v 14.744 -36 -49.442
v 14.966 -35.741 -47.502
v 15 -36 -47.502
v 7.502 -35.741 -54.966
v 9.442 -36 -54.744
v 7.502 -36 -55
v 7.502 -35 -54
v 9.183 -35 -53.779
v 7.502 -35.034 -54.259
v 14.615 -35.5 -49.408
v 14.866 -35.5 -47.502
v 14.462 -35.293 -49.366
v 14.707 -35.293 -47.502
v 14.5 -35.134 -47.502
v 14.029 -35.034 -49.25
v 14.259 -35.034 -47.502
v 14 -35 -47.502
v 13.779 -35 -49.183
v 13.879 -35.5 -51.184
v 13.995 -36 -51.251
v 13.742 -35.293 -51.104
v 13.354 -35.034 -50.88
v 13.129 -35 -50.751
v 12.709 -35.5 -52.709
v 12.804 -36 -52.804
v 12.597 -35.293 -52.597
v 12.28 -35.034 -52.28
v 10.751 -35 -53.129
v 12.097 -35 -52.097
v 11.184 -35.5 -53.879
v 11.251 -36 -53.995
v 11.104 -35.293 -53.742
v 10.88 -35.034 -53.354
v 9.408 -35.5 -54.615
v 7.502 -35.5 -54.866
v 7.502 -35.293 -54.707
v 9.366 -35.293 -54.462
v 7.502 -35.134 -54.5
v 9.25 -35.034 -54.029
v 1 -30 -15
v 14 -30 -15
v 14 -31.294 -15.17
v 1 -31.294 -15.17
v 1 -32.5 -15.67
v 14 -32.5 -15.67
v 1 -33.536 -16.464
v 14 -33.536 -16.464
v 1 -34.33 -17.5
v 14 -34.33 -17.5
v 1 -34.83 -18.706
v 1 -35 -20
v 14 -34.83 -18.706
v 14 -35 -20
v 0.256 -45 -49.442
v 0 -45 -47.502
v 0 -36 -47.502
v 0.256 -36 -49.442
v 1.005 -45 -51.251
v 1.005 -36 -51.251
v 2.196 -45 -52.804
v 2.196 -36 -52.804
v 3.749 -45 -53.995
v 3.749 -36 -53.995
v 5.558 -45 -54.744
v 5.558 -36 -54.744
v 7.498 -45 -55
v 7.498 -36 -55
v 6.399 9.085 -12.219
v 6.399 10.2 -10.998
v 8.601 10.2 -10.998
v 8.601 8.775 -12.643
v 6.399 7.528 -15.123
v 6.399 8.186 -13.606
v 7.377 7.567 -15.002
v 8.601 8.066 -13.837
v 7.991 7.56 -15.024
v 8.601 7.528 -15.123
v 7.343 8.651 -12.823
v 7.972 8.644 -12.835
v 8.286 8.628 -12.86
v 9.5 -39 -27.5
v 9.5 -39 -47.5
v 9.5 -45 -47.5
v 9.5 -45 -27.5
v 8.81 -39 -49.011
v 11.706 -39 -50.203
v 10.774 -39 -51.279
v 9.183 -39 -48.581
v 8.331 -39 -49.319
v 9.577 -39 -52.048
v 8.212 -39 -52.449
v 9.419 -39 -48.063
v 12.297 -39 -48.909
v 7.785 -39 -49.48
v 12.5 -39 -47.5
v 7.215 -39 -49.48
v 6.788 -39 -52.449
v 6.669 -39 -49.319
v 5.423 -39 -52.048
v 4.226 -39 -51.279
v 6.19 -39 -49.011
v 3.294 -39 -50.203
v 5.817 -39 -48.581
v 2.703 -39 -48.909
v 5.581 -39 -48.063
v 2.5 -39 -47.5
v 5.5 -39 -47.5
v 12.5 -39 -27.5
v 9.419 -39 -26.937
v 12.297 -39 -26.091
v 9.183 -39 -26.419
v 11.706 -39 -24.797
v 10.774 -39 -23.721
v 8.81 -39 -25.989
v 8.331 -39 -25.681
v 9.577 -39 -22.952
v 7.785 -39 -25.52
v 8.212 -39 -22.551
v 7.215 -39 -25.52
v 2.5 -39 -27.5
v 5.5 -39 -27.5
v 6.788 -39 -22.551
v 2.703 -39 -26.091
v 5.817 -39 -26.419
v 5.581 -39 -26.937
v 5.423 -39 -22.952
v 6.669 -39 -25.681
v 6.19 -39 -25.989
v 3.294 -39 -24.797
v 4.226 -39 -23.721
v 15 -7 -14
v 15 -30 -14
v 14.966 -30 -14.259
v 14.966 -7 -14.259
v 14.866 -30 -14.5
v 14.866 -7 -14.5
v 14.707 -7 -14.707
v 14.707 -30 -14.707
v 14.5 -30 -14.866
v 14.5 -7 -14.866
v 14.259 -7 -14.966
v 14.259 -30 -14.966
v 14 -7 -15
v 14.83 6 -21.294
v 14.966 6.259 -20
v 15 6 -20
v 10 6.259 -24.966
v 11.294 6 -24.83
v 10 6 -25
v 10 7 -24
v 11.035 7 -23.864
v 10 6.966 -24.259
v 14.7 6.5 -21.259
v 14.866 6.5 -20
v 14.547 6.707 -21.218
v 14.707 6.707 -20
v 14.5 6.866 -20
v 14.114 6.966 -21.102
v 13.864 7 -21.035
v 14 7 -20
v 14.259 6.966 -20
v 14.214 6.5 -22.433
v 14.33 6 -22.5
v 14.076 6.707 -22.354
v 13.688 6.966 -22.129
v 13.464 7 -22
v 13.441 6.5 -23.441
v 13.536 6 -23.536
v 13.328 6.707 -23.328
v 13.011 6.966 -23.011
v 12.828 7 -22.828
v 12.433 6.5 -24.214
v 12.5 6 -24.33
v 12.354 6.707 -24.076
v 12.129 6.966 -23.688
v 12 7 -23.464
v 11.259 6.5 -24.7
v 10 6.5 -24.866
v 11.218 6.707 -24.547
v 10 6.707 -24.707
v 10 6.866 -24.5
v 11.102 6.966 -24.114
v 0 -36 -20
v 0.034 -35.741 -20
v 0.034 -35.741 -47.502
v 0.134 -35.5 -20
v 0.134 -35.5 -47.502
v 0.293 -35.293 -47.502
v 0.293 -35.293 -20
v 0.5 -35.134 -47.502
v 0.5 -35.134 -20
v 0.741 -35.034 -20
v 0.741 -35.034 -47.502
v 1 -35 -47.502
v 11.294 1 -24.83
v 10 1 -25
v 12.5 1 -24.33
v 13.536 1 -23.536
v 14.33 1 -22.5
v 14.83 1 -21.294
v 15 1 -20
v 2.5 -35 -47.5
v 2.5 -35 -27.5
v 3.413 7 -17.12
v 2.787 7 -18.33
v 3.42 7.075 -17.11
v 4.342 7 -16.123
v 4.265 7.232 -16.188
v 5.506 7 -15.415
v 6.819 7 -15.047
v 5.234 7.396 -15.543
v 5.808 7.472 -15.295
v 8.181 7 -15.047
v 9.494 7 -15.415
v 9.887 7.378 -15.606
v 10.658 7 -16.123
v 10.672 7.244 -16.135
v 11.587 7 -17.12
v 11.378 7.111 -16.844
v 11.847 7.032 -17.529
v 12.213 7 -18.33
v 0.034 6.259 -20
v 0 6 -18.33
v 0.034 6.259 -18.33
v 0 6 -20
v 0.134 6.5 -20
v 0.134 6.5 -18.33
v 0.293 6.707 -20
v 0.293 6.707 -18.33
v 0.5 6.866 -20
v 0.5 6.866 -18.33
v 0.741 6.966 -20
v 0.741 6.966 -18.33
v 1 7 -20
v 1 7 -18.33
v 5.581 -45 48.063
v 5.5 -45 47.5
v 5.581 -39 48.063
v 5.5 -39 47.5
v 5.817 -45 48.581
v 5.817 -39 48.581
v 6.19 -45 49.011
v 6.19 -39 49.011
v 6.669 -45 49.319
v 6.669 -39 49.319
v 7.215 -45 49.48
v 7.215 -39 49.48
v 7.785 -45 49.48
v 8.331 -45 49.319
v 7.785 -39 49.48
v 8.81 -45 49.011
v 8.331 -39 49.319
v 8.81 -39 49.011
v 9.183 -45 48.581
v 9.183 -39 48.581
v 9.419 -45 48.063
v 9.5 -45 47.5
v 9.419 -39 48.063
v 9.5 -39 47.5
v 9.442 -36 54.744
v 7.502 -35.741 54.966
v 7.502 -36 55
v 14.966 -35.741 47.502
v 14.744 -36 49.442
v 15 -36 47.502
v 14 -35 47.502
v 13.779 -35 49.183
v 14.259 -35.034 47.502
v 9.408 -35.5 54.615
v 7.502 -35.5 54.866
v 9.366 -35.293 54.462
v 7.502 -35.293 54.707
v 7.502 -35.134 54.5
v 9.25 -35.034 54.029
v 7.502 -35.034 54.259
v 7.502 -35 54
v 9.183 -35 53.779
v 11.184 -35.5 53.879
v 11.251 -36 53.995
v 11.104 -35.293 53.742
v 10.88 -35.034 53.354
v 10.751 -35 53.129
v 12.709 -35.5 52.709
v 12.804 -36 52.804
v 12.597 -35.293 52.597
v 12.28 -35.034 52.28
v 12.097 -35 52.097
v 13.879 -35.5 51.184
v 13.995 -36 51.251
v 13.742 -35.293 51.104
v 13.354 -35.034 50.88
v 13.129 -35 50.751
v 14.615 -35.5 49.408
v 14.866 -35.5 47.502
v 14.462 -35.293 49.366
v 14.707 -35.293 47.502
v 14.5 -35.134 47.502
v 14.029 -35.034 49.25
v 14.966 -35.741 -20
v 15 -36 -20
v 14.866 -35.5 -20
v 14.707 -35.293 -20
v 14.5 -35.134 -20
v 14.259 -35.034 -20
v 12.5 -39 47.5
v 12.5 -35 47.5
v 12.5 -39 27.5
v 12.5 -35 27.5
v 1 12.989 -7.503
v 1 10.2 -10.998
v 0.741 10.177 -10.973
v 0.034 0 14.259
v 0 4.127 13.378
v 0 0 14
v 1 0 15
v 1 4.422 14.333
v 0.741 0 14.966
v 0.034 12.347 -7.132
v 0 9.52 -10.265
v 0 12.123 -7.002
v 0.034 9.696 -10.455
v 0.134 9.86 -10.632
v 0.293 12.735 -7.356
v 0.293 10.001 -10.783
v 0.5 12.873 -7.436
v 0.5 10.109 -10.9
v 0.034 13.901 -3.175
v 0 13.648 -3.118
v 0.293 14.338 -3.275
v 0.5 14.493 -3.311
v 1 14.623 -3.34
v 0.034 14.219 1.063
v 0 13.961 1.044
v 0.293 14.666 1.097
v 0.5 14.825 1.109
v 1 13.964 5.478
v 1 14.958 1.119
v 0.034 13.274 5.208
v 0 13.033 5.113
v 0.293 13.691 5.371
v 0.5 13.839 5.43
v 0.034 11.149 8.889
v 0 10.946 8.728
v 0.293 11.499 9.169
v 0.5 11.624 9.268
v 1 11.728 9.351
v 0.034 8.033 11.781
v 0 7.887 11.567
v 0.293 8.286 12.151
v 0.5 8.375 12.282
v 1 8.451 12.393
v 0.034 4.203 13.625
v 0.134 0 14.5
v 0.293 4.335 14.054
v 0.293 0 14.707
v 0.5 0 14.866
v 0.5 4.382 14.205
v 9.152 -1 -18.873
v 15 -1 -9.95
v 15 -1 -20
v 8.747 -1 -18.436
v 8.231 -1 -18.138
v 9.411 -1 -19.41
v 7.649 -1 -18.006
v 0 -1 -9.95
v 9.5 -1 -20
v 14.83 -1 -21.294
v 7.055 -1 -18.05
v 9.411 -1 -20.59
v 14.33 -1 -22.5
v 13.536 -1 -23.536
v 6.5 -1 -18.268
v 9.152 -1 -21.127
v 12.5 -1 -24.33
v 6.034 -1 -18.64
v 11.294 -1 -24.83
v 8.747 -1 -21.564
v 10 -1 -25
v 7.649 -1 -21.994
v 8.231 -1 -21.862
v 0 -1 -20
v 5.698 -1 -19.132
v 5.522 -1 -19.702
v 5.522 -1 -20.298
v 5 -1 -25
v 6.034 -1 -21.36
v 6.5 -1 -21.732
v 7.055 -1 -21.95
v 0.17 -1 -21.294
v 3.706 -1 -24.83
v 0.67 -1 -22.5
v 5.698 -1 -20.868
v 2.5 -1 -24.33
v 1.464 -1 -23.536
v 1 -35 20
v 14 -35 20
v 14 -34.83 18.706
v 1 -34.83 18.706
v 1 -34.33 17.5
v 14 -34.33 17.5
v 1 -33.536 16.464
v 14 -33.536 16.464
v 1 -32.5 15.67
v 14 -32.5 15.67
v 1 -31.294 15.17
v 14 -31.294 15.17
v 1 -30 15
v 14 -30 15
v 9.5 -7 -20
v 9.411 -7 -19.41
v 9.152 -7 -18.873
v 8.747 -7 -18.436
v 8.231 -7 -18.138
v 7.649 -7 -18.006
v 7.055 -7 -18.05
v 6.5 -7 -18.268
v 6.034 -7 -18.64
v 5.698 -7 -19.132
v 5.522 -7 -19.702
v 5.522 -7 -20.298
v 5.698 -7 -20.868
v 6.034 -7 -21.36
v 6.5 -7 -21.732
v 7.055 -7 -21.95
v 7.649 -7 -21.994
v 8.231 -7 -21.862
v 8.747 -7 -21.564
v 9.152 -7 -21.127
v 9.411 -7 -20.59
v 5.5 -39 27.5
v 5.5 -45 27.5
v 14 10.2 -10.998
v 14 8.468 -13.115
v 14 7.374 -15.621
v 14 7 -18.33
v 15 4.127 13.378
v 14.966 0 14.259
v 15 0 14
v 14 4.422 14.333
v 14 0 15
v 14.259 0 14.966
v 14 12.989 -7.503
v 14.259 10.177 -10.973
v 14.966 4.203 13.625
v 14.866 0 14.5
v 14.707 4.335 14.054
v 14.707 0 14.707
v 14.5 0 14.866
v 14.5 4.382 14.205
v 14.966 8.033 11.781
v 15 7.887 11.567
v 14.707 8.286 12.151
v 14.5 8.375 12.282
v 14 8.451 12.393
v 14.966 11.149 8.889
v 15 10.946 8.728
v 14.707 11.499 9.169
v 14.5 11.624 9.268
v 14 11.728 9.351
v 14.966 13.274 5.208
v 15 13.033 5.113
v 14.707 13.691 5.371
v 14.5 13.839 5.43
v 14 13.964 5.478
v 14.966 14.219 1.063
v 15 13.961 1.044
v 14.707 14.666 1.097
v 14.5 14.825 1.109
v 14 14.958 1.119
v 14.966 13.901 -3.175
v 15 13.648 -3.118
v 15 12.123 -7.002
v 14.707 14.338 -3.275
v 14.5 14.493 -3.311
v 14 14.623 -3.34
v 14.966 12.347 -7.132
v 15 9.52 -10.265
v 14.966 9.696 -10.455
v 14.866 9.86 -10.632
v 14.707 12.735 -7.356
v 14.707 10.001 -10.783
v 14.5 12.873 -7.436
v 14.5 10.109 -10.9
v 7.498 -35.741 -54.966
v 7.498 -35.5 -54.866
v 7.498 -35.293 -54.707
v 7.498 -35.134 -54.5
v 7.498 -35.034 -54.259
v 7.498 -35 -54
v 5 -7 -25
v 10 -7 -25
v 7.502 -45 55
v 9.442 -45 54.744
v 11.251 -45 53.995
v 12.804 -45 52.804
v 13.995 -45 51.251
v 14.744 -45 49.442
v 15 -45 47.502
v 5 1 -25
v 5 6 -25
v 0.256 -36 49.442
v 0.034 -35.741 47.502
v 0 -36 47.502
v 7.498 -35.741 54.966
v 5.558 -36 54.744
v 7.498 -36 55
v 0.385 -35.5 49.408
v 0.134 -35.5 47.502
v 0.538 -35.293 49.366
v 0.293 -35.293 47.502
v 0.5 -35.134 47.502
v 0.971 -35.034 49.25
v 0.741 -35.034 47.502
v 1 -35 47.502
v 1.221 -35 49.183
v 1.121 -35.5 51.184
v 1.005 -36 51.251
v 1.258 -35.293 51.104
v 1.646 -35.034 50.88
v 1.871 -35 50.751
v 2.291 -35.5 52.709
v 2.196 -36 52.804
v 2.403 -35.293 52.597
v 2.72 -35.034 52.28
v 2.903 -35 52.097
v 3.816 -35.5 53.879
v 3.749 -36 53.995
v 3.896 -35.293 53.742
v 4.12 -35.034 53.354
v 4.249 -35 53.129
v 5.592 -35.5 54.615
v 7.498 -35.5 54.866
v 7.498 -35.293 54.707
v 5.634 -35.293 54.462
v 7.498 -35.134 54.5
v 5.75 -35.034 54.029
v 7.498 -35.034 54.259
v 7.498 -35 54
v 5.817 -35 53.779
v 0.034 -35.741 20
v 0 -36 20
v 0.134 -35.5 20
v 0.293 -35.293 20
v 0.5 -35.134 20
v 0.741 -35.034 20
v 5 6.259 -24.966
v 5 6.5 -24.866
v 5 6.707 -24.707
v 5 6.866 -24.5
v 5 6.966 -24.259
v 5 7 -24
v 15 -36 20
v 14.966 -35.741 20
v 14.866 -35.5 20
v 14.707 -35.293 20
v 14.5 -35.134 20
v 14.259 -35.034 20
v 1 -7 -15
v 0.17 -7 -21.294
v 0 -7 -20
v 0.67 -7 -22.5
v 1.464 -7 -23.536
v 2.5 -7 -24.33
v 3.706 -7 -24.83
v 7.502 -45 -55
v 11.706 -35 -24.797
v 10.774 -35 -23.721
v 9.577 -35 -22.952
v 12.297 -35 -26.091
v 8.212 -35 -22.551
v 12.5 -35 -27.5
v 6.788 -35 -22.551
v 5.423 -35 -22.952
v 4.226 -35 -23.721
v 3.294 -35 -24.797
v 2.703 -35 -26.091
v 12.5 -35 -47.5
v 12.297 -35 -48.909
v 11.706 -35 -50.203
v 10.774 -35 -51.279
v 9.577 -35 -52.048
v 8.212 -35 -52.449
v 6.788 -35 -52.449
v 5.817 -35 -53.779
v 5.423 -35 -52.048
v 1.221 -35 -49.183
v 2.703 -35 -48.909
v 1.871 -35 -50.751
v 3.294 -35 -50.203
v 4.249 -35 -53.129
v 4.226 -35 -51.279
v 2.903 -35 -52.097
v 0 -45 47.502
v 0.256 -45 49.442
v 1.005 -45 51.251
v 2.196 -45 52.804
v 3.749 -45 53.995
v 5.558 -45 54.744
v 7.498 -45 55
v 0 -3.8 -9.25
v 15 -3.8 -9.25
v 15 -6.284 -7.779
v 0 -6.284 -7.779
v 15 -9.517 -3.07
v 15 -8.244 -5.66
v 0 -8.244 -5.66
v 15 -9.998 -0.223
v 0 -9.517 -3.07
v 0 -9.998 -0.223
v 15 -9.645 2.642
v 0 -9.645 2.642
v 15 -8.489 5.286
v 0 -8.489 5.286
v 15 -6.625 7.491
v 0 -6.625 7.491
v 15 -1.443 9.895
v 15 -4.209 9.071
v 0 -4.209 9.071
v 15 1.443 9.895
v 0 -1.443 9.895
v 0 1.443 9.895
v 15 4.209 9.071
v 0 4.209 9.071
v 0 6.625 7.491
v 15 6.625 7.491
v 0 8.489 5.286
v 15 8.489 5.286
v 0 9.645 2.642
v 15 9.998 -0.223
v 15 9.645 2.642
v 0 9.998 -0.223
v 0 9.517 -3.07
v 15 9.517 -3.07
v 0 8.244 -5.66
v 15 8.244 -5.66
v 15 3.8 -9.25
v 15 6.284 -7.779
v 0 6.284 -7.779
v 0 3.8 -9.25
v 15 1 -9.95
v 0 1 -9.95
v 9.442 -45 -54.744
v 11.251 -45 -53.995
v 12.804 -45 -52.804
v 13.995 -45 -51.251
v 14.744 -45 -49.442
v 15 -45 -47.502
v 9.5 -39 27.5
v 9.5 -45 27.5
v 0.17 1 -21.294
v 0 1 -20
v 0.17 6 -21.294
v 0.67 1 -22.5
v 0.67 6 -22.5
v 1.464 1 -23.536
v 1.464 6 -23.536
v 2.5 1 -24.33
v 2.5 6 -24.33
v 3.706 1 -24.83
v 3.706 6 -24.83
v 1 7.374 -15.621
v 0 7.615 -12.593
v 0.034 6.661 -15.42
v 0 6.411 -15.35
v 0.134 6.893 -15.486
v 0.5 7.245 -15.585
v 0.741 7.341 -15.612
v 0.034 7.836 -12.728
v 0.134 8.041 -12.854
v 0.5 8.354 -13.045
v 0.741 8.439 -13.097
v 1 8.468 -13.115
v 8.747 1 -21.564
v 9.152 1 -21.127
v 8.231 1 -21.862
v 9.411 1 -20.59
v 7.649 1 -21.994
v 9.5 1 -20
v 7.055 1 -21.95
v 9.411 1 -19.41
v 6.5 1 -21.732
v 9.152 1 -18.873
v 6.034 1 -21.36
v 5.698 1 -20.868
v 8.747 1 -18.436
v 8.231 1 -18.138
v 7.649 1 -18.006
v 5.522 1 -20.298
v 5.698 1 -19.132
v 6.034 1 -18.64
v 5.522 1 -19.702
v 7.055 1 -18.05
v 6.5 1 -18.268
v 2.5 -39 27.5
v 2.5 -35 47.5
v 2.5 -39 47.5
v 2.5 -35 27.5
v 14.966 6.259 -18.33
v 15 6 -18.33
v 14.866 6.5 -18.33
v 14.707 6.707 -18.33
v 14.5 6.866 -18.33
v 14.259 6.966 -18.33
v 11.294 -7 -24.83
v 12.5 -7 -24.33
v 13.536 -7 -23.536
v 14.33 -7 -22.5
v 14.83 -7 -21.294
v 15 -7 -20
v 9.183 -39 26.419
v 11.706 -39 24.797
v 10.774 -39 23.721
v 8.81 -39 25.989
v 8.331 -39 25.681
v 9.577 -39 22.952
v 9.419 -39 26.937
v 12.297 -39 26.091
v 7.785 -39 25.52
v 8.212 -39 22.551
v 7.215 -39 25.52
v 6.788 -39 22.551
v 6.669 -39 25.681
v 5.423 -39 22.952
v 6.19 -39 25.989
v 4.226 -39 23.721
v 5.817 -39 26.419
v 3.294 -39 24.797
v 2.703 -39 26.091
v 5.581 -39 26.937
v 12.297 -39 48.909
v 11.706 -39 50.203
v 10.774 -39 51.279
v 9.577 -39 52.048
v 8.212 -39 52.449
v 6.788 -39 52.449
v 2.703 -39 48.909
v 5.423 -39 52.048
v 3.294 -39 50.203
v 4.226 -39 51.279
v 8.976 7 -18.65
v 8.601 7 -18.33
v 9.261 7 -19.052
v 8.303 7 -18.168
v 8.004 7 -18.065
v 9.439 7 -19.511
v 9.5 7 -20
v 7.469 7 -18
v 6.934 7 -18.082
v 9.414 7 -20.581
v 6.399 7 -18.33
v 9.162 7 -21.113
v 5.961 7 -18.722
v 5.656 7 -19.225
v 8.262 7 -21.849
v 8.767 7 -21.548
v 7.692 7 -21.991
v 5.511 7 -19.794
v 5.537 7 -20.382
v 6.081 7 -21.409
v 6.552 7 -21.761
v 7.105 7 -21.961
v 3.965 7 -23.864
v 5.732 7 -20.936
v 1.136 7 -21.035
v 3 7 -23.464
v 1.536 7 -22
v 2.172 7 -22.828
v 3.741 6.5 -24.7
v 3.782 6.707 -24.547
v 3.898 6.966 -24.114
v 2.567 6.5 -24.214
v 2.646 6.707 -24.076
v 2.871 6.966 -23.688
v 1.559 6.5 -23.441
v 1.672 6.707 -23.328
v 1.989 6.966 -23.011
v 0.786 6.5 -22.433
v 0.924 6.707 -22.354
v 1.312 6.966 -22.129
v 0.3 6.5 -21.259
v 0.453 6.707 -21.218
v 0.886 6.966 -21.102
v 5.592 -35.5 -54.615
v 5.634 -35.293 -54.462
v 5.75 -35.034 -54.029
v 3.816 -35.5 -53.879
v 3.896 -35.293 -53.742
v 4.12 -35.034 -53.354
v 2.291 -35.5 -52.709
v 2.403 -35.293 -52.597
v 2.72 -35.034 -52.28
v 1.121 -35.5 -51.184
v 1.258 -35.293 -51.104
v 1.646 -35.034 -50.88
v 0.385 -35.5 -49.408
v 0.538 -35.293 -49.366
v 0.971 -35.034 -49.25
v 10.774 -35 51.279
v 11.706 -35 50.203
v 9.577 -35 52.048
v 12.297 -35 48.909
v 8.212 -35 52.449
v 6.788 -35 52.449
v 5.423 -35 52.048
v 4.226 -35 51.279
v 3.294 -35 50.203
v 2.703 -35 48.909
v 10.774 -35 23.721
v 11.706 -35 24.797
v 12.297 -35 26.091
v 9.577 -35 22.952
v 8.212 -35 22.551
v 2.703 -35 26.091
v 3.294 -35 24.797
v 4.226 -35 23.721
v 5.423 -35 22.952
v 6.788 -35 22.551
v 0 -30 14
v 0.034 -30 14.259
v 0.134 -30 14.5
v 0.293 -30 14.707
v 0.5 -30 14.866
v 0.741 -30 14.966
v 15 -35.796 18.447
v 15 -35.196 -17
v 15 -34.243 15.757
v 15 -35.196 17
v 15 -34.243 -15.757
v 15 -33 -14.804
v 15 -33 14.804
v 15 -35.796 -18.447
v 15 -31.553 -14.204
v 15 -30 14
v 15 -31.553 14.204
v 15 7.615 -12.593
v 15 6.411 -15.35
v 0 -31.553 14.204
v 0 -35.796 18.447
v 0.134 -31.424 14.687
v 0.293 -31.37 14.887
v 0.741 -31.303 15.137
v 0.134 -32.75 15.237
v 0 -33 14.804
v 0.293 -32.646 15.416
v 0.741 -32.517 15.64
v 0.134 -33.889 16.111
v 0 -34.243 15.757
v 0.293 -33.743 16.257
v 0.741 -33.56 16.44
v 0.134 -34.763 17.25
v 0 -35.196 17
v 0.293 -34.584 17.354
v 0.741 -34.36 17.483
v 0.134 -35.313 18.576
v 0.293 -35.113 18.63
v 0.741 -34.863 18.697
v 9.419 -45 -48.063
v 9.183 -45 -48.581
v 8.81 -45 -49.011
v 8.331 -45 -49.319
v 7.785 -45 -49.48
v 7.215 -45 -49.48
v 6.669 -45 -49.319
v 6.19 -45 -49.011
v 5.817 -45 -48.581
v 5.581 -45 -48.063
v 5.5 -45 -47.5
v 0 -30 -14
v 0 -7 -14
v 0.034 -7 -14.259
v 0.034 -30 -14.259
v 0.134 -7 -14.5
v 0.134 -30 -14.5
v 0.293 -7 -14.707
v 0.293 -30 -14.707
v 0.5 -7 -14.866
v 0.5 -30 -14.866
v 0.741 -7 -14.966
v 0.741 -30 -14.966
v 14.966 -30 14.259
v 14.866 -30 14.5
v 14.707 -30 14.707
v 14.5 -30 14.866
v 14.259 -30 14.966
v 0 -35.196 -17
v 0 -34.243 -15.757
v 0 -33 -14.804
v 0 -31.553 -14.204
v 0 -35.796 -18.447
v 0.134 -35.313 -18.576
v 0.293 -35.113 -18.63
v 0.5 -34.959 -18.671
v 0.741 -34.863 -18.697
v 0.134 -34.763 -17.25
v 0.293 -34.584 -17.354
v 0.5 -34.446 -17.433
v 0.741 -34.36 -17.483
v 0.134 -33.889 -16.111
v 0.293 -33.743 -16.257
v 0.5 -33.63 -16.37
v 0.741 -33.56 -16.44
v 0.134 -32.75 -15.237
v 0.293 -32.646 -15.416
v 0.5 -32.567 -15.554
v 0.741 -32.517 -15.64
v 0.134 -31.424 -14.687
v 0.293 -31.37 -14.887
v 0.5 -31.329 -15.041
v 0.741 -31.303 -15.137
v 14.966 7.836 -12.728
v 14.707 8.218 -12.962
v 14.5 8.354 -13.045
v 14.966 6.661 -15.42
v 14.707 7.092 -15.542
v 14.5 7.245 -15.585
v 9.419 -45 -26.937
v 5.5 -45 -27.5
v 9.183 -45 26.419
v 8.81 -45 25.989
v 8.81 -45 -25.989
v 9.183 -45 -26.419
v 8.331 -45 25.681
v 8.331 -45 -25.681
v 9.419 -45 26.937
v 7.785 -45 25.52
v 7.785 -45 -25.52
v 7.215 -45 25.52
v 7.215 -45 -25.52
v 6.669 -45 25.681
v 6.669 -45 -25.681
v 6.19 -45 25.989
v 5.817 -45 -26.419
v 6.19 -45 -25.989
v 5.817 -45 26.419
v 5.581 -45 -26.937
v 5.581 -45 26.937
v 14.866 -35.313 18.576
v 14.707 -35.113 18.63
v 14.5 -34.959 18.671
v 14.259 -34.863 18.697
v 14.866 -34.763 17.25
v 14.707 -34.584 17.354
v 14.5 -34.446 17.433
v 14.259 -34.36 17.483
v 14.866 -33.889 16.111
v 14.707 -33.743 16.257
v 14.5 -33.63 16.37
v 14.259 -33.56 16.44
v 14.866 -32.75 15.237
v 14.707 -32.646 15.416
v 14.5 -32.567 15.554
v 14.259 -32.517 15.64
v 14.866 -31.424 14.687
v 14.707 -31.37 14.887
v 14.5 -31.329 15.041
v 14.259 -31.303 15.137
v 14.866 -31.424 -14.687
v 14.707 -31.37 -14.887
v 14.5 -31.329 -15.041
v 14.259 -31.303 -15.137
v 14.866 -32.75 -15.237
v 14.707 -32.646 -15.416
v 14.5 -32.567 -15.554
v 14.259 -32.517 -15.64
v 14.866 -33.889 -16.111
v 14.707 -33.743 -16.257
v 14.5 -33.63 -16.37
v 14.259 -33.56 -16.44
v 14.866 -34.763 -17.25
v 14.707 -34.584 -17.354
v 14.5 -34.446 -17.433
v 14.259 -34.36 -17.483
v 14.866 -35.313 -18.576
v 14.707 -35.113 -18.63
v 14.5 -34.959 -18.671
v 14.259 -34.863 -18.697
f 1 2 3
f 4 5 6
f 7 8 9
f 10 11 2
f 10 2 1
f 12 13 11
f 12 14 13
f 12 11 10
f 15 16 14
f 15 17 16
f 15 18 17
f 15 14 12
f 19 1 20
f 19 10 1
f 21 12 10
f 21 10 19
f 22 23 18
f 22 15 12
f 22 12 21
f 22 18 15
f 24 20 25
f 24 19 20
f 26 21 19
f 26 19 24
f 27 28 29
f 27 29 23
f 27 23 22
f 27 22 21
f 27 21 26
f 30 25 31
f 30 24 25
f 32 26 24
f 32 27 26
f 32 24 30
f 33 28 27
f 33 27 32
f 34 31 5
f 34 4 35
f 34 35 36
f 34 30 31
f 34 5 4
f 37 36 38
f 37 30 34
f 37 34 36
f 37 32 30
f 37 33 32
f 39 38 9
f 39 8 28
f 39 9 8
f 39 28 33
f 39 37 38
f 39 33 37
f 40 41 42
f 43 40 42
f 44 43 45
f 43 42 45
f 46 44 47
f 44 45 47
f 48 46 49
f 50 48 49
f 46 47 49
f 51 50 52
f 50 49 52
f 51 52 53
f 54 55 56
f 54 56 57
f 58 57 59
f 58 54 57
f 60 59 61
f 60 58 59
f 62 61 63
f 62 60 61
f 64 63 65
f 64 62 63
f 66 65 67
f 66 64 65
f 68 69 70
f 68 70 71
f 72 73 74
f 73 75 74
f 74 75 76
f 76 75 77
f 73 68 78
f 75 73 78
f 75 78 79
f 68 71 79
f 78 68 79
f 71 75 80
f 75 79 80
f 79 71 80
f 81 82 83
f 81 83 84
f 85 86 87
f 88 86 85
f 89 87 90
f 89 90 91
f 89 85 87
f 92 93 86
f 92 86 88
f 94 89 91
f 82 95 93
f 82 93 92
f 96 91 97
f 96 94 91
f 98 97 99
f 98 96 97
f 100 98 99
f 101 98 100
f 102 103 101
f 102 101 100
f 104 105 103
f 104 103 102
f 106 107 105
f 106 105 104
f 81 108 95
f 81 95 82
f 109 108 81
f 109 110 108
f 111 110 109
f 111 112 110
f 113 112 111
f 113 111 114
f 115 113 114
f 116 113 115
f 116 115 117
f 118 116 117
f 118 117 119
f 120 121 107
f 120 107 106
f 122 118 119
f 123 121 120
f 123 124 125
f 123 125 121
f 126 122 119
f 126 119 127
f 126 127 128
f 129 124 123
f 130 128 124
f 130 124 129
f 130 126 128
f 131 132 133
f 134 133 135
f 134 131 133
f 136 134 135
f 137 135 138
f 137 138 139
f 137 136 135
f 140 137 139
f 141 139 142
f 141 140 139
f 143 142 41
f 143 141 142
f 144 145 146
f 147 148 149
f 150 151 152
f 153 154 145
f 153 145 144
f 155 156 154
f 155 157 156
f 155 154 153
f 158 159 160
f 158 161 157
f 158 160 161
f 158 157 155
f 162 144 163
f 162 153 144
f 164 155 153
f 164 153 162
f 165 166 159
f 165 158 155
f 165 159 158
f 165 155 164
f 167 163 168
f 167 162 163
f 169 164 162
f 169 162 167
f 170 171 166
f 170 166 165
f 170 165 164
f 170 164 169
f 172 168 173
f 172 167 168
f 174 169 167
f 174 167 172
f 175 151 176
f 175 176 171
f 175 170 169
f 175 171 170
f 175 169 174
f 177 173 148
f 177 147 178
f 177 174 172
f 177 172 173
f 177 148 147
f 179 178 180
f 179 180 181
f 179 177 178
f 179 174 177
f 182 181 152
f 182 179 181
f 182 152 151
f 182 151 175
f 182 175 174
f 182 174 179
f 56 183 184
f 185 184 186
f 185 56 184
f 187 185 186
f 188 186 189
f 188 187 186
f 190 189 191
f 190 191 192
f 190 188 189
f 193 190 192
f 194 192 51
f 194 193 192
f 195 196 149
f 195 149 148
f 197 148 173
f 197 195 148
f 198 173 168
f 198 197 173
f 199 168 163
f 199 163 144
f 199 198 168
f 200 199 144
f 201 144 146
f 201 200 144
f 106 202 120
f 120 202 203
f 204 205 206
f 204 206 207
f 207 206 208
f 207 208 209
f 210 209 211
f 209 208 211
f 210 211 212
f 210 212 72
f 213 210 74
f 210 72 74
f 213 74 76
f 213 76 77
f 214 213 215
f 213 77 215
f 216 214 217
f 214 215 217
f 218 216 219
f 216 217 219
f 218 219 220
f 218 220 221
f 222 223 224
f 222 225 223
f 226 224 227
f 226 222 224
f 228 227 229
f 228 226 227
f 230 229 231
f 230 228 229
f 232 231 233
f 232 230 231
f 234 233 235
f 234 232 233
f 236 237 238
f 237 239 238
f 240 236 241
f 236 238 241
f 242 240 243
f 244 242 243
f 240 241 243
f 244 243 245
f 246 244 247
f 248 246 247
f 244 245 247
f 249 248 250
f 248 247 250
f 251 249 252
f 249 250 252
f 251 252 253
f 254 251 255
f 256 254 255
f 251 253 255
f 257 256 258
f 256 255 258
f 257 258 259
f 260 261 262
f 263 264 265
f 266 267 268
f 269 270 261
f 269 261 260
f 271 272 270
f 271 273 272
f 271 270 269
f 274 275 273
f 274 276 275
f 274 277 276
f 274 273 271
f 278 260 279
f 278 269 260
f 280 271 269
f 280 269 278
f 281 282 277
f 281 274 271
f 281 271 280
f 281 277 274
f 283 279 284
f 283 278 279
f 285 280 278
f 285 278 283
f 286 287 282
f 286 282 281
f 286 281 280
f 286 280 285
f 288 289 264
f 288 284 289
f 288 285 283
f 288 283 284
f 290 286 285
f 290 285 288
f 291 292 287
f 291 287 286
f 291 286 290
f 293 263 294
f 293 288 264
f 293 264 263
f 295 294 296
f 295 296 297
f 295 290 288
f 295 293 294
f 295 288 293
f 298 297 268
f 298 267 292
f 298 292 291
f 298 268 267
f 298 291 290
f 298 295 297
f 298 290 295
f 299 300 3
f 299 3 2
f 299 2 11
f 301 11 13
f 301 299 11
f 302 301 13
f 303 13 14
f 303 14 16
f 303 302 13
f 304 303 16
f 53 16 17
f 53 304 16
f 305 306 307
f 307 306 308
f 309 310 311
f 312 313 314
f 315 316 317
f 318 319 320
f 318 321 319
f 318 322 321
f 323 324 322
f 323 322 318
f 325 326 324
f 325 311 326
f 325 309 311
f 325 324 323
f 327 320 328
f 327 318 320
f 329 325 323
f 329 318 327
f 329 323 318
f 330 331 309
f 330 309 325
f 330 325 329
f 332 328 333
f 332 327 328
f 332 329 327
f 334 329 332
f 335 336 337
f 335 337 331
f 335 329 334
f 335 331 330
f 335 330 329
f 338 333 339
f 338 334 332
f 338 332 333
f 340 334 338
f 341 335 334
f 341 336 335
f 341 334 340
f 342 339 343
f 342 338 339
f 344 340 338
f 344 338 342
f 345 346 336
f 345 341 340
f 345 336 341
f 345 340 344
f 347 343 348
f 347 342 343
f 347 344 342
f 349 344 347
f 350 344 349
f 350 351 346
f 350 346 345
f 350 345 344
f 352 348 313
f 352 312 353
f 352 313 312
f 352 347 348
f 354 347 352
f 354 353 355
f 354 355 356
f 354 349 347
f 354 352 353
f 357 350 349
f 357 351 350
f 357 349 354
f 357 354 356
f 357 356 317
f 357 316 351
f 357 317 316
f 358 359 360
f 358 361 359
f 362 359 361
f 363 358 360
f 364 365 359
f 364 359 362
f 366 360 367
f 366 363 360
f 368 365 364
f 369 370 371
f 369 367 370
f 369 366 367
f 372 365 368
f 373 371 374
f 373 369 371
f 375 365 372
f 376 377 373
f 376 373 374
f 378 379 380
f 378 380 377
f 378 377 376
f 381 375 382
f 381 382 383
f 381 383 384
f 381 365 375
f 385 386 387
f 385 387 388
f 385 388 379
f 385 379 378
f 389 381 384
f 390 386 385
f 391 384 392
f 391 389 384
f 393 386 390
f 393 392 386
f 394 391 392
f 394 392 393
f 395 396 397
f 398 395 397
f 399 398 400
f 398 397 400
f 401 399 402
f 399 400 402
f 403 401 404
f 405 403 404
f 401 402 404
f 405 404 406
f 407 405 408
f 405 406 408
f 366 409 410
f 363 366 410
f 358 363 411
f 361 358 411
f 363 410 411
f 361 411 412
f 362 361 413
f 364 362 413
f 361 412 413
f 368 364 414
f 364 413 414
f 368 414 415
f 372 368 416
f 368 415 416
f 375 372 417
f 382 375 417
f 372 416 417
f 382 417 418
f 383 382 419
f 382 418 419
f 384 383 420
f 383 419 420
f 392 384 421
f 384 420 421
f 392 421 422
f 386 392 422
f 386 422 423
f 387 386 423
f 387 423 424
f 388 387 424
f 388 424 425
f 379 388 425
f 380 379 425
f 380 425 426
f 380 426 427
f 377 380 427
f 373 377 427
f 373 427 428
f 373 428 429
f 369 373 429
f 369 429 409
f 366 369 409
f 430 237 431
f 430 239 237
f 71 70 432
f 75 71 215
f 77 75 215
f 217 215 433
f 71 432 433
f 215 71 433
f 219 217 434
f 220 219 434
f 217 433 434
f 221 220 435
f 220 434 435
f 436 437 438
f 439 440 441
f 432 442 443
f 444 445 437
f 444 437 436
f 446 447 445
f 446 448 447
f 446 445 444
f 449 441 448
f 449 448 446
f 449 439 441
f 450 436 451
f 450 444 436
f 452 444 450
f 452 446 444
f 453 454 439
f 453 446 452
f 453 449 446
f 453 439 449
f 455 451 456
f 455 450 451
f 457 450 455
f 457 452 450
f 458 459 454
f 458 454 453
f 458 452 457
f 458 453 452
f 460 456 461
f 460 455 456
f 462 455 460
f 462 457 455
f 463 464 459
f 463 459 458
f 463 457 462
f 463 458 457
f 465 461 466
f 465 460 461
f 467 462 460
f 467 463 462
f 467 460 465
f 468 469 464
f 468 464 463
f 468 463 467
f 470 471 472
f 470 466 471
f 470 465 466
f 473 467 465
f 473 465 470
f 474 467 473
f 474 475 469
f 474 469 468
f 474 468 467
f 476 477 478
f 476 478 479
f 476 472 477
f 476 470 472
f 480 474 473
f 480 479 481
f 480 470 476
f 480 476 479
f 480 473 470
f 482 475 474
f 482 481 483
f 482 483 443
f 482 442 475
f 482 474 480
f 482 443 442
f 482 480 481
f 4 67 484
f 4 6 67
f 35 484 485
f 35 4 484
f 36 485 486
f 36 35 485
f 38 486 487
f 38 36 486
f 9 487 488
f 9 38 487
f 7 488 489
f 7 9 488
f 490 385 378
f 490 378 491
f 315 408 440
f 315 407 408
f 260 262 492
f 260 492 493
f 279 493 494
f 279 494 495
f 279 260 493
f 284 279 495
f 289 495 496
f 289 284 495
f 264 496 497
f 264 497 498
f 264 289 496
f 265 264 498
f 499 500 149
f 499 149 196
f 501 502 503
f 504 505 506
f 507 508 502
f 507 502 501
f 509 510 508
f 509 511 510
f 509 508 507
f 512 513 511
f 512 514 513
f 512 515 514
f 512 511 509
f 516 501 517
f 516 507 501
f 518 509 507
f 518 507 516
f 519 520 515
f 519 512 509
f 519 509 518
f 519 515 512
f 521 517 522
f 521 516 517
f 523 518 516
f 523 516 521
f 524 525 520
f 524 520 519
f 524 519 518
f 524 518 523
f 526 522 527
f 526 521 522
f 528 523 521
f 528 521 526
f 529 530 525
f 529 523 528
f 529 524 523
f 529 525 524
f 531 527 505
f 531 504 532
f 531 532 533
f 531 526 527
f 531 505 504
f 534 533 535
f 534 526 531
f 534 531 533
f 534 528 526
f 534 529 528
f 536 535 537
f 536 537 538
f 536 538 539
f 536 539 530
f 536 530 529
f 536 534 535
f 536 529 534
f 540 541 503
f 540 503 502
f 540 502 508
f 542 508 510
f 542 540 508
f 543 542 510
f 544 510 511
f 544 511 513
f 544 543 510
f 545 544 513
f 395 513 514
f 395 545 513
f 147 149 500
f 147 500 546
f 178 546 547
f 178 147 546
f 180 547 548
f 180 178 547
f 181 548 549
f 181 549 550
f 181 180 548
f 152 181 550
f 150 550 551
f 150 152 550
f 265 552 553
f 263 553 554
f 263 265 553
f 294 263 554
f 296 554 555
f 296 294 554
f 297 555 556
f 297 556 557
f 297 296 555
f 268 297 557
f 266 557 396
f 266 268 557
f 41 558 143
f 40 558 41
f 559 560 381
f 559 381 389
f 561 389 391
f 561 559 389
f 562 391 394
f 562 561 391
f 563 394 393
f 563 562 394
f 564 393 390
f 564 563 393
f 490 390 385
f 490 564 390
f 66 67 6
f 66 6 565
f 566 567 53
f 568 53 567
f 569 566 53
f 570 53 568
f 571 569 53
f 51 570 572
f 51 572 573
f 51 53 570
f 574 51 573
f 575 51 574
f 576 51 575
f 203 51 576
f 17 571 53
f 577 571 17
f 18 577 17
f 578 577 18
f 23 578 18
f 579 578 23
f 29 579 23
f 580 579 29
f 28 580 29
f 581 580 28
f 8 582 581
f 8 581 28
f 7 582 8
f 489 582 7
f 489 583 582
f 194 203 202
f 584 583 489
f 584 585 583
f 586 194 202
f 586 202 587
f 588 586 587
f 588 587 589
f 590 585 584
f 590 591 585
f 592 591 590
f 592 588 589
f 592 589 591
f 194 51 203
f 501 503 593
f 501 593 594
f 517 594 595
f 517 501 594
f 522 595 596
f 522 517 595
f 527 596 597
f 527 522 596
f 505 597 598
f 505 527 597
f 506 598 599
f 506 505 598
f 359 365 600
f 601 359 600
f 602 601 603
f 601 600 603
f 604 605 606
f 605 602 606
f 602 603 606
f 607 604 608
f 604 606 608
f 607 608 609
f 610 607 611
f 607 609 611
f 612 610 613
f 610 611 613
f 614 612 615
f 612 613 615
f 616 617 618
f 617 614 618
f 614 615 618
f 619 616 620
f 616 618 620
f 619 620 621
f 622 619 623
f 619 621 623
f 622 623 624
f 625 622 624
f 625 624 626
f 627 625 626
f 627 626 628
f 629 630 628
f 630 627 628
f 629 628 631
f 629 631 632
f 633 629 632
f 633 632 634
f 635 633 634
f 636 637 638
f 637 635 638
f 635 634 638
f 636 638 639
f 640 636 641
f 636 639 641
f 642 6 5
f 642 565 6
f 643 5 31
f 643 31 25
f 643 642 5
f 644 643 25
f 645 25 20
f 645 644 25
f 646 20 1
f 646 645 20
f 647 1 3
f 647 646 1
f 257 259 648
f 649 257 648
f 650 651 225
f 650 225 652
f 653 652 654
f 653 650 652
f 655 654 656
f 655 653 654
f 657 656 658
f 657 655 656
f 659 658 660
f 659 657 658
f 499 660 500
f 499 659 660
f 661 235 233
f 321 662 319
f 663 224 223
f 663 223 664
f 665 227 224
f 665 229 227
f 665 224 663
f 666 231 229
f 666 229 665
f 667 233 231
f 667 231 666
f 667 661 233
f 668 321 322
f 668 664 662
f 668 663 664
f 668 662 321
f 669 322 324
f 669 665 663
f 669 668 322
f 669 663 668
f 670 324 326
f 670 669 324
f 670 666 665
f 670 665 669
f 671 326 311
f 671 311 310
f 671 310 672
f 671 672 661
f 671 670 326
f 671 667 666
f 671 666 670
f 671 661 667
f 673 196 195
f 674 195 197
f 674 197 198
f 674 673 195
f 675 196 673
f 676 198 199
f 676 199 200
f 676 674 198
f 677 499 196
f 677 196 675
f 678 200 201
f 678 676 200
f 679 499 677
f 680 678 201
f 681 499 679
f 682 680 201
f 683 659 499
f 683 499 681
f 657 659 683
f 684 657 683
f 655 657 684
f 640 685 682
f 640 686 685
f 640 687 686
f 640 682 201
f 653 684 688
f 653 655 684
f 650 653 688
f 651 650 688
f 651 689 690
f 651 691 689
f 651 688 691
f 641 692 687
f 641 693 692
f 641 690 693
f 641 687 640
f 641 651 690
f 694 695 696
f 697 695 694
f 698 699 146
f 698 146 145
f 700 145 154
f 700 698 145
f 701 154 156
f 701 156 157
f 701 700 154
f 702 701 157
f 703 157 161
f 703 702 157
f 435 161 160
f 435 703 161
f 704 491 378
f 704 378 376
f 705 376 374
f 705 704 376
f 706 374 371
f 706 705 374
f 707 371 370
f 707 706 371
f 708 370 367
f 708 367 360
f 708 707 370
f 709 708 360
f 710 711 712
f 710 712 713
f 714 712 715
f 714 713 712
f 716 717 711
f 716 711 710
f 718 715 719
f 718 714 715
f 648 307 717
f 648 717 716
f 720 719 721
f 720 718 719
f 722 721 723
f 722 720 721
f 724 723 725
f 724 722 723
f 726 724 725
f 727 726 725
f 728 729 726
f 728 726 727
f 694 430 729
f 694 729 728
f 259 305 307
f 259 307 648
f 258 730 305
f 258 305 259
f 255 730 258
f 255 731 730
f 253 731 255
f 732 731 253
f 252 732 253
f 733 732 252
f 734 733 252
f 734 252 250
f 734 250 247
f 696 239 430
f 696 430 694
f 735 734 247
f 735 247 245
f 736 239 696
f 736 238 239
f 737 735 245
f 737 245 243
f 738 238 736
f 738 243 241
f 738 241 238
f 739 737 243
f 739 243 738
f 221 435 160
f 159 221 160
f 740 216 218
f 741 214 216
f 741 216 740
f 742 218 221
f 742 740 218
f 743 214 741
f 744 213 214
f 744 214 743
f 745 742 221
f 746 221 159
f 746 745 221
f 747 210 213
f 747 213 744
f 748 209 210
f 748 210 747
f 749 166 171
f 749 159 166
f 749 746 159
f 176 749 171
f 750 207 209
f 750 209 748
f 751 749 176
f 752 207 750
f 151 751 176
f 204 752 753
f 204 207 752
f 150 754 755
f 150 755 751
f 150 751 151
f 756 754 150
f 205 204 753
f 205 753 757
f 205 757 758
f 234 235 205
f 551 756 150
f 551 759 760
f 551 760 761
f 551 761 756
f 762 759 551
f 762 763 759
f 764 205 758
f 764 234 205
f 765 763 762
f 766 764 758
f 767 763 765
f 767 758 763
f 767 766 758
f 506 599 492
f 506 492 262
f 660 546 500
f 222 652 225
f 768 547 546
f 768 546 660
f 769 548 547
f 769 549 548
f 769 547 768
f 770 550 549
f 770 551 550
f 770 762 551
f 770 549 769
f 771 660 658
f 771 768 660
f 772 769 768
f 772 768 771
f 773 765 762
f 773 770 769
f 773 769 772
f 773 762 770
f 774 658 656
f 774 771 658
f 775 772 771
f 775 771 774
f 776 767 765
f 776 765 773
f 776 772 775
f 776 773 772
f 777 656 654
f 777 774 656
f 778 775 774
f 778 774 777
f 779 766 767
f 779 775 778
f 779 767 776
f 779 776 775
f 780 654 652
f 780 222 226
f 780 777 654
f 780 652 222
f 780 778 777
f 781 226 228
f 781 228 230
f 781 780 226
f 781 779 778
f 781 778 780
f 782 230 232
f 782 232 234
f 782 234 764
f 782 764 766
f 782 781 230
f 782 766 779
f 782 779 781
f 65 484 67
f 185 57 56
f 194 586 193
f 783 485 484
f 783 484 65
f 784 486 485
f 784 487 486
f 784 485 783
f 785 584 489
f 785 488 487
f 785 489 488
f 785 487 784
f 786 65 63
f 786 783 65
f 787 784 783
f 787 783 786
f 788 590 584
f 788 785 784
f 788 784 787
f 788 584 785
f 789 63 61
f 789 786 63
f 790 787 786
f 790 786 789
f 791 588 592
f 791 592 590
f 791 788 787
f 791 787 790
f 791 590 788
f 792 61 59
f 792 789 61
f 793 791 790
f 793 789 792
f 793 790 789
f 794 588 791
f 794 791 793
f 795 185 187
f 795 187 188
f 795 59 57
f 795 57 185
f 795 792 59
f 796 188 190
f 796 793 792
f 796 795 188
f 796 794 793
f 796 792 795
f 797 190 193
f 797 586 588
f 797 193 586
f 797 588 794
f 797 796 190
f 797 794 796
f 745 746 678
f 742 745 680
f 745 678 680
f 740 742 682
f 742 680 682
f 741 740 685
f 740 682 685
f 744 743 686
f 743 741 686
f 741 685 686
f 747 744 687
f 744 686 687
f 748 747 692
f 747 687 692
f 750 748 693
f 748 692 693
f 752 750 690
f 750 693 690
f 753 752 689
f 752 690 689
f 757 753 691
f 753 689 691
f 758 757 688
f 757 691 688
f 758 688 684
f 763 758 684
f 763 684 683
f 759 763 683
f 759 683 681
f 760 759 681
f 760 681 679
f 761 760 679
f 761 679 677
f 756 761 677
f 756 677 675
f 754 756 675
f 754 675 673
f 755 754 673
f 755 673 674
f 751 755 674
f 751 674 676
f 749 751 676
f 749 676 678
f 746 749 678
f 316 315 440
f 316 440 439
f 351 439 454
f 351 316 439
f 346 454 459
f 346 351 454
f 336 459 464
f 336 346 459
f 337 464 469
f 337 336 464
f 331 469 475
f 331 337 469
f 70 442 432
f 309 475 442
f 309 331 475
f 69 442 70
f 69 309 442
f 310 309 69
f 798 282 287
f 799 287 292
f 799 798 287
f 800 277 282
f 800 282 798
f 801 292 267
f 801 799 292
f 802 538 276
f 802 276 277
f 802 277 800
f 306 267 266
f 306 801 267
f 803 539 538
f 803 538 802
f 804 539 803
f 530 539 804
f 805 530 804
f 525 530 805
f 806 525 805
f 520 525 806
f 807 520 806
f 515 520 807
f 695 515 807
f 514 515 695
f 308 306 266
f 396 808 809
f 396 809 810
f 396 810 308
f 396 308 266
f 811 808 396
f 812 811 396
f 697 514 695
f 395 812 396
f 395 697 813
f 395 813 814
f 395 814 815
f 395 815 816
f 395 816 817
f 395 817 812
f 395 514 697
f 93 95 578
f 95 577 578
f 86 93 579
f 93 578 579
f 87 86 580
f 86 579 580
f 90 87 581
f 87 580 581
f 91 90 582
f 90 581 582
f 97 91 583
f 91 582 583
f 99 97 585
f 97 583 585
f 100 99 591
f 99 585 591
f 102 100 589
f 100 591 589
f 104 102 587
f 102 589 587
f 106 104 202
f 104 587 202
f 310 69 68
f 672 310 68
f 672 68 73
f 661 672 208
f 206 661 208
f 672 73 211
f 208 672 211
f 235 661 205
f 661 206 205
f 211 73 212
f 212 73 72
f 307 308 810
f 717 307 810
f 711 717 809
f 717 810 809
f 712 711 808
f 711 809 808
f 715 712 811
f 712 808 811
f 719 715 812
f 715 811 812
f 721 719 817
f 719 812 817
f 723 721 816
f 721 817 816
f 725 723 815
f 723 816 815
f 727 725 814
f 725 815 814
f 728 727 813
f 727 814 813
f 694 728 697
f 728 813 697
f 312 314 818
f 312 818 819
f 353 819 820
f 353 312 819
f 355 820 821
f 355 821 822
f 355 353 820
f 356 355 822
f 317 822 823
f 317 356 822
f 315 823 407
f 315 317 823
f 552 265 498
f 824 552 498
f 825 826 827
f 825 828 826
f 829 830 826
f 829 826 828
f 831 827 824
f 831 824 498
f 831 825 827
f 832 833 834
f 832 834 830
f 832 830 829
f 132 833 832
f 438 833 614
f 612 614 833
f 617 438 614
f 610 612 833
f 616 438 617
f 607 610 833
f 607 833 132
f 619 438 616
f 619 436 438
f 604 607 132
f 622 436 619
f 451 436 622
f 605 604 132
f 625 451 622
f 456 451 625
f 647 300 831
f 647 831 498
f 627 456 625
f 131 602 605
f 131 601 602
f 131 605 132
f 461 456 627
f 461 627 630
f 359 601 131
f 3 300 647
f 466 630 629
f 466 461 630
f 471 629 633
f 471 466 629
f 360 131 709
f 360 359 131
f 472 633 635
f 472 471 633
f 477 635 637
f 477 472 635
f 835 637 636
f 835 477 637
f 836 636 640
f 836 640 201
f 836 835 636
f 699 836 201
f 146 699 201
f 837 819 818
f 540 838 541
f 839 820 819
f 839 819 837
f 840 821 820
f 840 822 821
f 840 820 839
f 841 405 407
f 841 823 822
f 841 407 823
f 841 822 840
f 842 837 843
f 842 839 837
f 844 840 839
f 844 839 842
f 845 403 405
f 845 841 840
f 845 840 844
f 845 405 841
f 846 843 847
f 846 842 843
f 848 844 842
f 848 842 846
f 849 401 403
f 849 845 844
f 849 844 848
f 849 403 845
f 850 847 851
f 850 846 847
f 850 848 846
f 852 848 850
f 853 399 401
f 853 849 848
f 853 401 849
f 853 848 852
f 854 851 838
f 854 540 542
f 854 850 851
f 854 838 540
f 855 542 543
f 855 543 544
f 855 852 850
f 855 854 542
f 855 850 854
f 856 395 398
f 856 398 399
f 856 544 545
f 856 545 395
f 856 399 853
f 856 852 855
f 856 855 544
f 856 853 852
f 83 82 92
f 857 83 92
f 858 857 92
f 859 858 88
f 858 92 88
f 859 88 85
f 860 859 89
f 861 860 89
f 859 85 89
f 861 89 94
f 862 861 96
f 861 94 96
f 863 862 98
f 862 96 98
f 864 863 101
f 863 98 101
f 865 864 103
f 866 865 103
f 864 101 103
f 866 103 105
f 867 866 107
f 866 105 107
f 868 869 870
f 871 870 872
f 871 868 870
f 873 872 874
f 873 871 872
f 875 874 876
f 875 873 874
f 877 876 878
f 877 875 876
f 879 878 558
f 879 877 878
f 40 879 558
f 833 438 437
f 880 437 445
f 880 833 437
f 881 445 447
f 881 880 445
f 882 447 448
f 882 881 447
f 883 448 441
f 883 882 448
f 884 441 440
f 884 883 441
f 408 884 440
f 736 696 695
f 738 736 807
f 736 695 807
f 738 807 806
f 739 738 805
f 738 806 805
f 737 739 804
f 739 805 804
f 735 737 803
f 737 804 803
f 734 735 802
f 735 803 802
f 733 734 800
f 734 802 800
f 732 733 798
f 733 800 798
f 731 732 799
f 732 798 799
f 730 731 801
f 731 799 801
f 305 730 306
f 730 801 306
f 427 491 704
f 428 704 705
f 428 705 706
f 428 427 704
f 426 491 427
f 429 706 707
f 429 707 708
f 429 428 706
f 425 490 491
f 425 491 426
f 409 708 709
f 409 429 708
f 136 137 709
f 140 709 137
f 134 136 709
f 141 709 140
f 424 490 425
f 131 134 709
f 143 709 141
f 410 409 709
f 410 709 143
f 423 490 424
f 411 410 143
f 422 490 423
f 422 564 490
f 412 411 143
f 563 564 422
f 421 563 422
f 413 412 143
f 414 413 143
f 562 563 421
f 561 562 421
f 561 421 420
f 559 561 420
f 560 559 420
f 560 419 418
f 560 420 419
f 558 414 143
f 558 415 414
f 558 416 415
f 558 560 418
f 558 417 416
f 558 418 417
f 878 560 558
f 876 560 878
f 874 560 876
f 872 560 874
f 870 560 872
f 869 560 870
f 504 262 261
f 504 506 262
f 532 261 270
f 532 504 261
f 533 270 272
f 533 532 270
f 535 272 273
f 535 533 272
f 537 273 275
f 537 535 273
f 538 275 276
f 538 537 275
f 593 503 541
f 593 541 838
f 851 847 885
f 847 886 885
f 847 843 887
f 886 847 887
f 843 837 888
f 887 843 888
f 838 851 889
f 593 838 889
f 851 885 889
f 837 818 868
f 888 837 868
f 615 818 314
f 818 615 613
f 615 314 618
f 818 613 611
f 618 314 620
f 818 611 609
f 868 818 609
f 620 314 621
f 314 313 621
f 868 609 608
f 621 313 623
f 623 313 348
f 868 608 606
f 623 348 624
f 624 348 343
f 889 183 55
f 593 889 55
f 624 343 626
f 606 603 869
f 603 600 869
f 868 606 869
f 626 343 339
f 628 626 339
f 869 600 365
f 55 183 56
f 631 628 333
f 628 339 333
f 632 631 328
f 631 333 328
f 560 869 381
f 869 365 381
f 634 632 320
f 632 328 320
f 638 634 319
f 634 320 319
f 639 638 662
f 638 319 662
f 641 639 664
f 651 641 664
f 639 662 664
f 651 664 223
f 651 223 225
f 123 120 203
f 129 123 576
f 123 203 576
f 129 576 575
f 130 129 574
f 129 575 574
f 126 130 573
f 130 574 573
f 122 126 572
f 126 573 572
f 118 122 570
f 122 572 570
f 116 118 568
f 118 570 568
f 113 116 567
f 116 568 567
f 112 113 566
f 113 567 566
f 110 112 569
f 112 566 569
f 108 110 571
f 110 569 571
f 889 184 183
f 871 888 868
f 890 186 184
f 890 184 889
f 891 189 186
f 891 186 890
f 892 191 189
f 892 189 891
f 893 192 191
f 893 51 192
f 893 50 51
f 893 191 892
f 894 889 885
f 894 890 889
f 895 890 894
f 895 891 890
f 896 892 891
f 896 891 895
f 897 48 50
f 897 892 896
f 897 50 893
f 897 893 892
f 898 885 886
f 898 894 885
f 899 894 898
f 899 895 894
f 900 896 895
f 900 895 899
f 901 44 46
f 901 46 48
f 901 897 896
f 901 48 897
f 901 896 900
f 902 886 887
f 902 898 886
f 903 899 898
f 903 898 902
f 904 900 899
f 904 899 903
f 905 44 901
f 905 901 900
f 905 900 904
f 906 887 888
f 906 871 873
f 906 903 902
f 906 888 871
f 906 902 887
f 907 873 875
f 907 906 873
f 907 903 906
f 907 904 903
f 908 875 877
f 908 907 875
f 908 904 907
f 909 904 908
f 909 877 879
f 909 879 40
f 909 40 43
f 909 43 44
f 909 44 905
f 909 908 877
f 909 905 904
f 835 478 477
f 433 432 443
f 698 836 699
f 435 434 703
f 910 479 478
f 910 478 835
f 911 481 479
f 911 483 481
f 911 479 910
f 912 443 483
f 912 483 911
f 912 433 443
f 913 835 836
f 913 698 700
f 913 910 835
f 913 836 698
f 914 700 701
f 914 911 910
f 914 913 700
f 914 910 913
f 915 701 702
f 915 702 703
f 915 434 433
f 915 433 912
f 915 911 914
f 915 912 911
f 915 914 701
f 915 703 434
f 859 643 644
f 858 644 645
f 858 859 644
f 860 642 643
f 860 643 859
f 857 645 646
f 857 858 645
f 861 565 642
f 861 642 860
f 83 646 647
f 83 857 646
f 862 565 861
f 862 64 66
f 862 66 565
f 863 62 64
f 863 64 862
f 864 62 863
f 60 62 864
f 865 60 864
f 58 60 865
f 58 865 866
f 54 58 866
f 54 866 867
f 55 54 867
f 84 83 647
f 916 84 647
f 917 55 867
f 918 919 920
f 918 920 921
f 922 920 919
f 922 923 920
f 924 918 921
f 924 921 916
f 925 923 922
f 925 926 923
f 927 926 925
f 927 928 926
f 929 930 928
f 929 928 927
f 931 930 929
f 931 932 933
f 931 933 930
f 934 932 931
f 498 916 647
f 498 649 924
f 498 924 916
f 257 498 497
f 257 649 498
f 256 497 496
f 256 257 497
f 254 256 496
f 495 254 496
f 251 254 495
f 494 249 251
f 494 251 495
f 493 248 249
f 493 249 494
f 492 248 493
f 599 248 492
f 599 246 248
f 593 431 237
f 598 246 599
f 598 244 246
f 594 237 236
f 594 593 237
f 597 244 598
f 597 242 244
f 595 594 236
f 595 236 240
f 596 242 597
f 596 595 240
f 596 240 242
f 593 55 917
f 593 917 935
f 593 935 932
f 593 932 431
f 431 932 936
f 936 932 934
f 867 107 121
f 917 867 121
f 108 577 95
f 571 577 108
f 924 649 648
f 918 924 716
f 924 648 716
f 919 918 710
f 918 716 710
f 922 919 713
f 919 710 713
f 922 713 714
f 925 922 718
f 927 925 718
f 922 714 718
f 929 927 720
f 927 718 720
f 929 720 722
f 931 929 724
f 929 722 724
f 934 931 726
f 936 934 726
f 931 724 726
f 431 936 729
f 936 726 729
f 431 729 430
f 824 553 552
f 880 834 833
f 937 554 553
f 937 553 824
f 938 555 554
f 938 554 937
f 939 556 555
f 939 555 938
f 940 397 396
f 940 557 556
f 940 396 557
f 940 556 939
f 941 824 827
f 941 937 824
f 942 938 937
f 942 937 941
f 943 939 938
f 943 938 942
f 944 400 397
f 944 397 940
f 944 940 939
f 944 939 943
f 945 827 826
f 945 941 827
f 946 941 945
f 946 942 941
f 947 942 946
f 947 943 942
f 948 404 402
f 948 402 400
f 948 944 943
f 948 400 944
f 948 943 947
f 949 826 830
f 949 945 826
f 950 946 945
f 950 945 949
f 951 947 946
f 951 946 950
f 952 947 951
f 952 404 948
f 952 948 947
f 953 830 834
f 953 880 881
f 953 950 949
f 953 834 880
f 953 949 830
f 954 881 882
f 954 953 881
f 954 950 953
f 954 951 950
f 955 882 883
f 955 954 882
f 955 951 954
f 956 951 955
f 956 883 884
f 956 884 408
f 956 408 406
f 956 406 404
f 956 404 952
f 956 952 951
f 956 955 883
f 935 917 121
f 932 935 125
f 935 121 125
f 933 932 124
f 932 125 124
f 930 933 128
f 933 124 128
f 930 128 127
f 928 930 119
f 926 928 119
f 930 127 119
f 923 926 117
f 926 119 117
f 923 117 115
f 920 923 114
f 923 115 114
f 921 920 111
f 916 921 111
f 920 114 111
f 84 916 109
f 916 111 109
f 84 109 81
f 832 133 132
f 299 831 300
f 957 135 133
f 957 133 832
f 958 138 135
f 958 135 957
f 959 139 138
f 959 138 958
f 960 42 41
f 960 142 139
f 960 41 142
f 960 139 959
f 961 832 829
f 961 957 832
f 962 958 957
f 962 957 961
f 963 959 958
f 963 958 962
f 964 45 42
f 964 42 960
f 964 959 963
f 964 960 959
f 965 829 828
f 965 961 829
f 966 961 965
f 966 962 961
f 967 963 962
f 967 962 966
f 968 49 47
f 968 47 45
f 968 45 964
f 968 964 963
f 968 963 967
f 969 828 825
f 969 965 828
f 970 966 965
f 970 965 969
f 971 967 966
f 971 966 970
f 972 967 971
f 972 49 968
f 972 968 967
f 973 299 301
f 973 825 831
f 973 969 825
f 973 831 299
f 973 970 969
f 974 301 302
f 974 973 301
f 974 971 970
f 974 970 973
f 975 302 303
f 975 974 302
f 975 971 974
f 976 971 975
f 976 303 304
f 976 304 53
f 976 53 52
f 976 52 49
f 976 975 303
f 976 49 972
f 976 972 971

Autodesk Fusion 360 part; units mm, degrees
sketch "Esquisse1" plane through (0, 0, 0) normal (1, 0, 0) x (0, 0, -1)
  circle A0 centre (0, 0) radius 10 construction
  circle A1 centre (0, 0) radius 15 construction
  line L0 (15, -35) -> (15, 0) construction
  line L1 (-15, -35) -> (-15, 0) construction
  line L2 (4, 1) -> (25, 1) construction
  line L3 (4, -1) -> (25, -1) construction
  line L4 (25, -1) -> (25, -7) construction
  line L5 (25, -7) -> (13.2665, -7) construction
  line L6 (25, 1) -> (25, 7) construction
  line L7 (25, 7) -> (13.2665, 7) construction
  line L8 (-15, -35) -> (-55, -35) construction
  line L9 (-55, -35) -> (-55, -45) construction
  line L10 (15, -35) -> (55, -35) construction
  line L11 (55, -35) -> (55, -45) construction
  line L12 (55, -45) -> (-55, -45) construction
  line L13 (55, -45) -> (-55, -45)
  line L14 (-55, -45) -> (-55, -35)
  line L15 (-55, -35) -> (-15, -35)
  line L16 (-15, -35) -> (-15, 0)
  line L17 (13.2665, 7) -> (25, 7)
  line L18 (25, 7) -> (25, 1)
  line L19 (25, 1) -> (9.9499, 1)
  line L20 (9.9499, -1) -> (25, -1)
  line L21 (25, -1) -> (25, -7)
  line L22 (25, -7) -> (15, -7)
  line L23 (15, -7) -> (15, -35)
  line L24 (15, -35) -> (55, -35)
  line L25 (55, -35) -> (55, -45)
  arc A2 (13.2665, 7) -> (-15, 0) centre (0, 0) ccw
  arc A3 (9.9499, 1) -> (9.9499, -1) centre (0, 0) ccw
  dimension "d58" = 20
  dimension "d59" = 30
  dimension "d60" = 10
  dimension "d61" = 10
  dimension "d62" = 45
  dimension "d63" = 10
  dimension "d64" = 10
extrude "Extrusion8" add sketch "Esquisse1" along normal blind 15
fillet "Congé9" radius 7.5 4 edges at (15, -40, -55) (0, -40, -55) (15, -40, 55) (0, -40, 55)
fillet "Congé10" radius 5 2 edges at (7.5, -35, -15) (7.5, -35, 15)
sketch "Esquisse8" plane through (0, -35, 0) normal (0, 1, 0) x (-1, 0, 0)
  line L0 (-15, 20) -> (0, 20)
  line L1 (0, 20) -> (0, 47.5)
  arc A0 (0, 47.5) -> (-15, 47.5) centre (-7.5, 47.5) ccw
  line L2 (-15, 47.5) -> (-15, 20)
  line L3 (0, 47.5) -> (-15, 47.5) construction
  line L4 (-7.5, 55) -> (-7.5, 20) construction
  line L5 (0, 27.5) -> (-15, 27.5) construction
  line L6 (-2.5, 47.5) -> (-2.5, 27.5)
  line L7 (-5.5, 47.5) -> (-5.5, 27.5)
  arc A1 (-5.5, 47.5) -> (-7.5, 49.5) centre (-7.5, 47.5) ccw
  arc A2 (-2.5, 47.5) -> (-7.5, 52.5) centre (-7.5, 47.5) ccw
  arc A3 (-7.5, 25.5) -> (-5.5, 27.5) centre (-7.5, 27.5) ccw
  arc A4 (-7.5, 22.5) -> (-2.5, 27.5) centre (-7.5, 27.5) ccw
  arc A5 (-12.5, 27.5) -> (-7.5, 22.5) centre (-7.5, 27.5) ccw
  arc A6 (-9.5, 27.5) -> (-7.5, 25.5) centre (-7.5, 27.5) ccw
  line L8 (-9.5, 47.5) -> (-9.5, 27.5)
  line L9 (-12.5, 47.5) -> (-12.5, 27.5)
  arc A7 (-7.5, 52.5) -> (-12.5, 47.5) centre (-7.5, 47.5) ccw
  arc A8 (-7.5, 49.5) -> (-9.5, 47.5) centre (-7.5, 47.5) ccw
  line L10 (10, 0) -> (-30, 0)
  line L11 (-12.5, -47.5) -> (-12.5, -27.5)
  line L12 (-2.5, -47.5) -> (-2.5, -27.5)
  arc A9 (-7.5, -49.5) -> (-5.5, -47.5) centre (-7.5, -47.5) ccw
  arc A10 (-7.5, -52.5) -> (-2.5, -47.5) centre (-7.5, -47.5) ccw
  line L13 (-5.5, -47.5) -> (-5.5, -27.5)
  line L14 (0, -27.5) -> (-15, -27.5) construction
  arc A11 (-2.5, -27.5) -> (-7.5, -22.5) centre (-7.5, -27.5) ccw
  arc A12 (-5.5, -27.5) -> (-7.5, -25.5) centre (-7.5, -27.5) ccw
  arc A13 (-9.5, -47.5) -> (-7.5, -49.5) centre (-7.5, -47.5) ccw
  arc A14 (-12.5, -47.5) -> (-7.5, -52.5) centre (-7.5, -47.5) ccw
  line L15 (0, -47.5) -> (-15, -47.5) construction
  arc A15 (-7.5, -22.5) -> (-12.5, -27.5) centre (-7.5, -27.5) ccw
  line L16 (-9.5, -47.5) -> (-9.5, -27.5)
  arc A16 (-7.5, -25.5) -> (-9.5, -27.5) centre (-7.5, -27.5) ccw
  point P0 (-15, -47.5)
  point P1 (-7.5, -47.5)
  point P2 (0, -47.5)
  dimension "d71" = 20
  dimension "d72" = 5
  dimension "d73" = 2
extrude "Extrusion9" cut sketch "Esquisse8" against normal blind 20 contours L7 A1 A3 A6 L8 A8 | A9 L13 A12 A13 L16 A16
extrude "Extrusion10" cut sketch "Esquisse8" against normal blind 4 contours L6 A2 A4 A5 L9 A7 | L11 L12 A10 A11 A14 A15
sketch "Esquisse9" plane through (0, -7, 0) normal (0, -1, 0) x (1, 0, 0)
  line L0 (0, -15) -> (0, -25)
  line L1 (0, -25) -> (15, -25)
  line L2 (15, -25) -> (15, -15)
  line L3 (15, -15) -> (0, -15)
  line L4 (15, -25) -> (0, -15) construction
  line L5 (15, -15) -> (0, -25) construction
  circle A0 centre (7.5, -20) radius 2
  dimension "d78" = 4
extrude "Extrusion11" cut sketch "Esquisse9" against normal blind 35 contours A0
fillet "Congé11" radius 10 1 edges at (7.5, 7, -13.2665)
ref_plane "Plan de construction2" through (7.5, 12, -19.1332) normal (0, 1, 0) x (0, 0, 1)
sketch "Esquisse10" plane through (7.5, 12, -21.6652) normal (0, 1, 0) x (1, 0, 0)
  arc A0 (1.101, -3.3348) -> (-1.101, -3.3348) centre (0, -1.6652) ccw
  circle A1 centre (0, -1.6652) radius 5
  dimension "d84" = 10
extrude "Extrusion12" cut sketch "Esquisse10" against normal up to surface (5 mm away)
fillet "Congé12" radius 5 4 edges at (15, -4, -25) (15, 4, -25) (0, 4, -25) (0, -4, -25)
fillet "Congé13" radius 1 23 edges at (0, -15, 15) (0, -33.5355, 16.4645) (0, -35, 33.75) (7.5, -35, 55) (15, -35, 33.75) (15, -33.5355, 16.4645) (15, -15, 15) (15, 13.9638, 5.4785) (15, 7.8348, -14.3303) (15, 7, -19.1652) (13.5355, 7, -23.5355) (7.5, 7, -25) (1.4645, 7, -23.5355) (0, 7, -19.1652) (0, 7.8348, -14.3303) (0, 13.9638, 5.4785) (0, -18.5, -15) (0, -33.5355, -16.4645) (0, -35, -33.75) (7.5, -35, -55) (15, -35, -33.75) (15, -33.5355, -16.4645) (15, -18.5, -15)
